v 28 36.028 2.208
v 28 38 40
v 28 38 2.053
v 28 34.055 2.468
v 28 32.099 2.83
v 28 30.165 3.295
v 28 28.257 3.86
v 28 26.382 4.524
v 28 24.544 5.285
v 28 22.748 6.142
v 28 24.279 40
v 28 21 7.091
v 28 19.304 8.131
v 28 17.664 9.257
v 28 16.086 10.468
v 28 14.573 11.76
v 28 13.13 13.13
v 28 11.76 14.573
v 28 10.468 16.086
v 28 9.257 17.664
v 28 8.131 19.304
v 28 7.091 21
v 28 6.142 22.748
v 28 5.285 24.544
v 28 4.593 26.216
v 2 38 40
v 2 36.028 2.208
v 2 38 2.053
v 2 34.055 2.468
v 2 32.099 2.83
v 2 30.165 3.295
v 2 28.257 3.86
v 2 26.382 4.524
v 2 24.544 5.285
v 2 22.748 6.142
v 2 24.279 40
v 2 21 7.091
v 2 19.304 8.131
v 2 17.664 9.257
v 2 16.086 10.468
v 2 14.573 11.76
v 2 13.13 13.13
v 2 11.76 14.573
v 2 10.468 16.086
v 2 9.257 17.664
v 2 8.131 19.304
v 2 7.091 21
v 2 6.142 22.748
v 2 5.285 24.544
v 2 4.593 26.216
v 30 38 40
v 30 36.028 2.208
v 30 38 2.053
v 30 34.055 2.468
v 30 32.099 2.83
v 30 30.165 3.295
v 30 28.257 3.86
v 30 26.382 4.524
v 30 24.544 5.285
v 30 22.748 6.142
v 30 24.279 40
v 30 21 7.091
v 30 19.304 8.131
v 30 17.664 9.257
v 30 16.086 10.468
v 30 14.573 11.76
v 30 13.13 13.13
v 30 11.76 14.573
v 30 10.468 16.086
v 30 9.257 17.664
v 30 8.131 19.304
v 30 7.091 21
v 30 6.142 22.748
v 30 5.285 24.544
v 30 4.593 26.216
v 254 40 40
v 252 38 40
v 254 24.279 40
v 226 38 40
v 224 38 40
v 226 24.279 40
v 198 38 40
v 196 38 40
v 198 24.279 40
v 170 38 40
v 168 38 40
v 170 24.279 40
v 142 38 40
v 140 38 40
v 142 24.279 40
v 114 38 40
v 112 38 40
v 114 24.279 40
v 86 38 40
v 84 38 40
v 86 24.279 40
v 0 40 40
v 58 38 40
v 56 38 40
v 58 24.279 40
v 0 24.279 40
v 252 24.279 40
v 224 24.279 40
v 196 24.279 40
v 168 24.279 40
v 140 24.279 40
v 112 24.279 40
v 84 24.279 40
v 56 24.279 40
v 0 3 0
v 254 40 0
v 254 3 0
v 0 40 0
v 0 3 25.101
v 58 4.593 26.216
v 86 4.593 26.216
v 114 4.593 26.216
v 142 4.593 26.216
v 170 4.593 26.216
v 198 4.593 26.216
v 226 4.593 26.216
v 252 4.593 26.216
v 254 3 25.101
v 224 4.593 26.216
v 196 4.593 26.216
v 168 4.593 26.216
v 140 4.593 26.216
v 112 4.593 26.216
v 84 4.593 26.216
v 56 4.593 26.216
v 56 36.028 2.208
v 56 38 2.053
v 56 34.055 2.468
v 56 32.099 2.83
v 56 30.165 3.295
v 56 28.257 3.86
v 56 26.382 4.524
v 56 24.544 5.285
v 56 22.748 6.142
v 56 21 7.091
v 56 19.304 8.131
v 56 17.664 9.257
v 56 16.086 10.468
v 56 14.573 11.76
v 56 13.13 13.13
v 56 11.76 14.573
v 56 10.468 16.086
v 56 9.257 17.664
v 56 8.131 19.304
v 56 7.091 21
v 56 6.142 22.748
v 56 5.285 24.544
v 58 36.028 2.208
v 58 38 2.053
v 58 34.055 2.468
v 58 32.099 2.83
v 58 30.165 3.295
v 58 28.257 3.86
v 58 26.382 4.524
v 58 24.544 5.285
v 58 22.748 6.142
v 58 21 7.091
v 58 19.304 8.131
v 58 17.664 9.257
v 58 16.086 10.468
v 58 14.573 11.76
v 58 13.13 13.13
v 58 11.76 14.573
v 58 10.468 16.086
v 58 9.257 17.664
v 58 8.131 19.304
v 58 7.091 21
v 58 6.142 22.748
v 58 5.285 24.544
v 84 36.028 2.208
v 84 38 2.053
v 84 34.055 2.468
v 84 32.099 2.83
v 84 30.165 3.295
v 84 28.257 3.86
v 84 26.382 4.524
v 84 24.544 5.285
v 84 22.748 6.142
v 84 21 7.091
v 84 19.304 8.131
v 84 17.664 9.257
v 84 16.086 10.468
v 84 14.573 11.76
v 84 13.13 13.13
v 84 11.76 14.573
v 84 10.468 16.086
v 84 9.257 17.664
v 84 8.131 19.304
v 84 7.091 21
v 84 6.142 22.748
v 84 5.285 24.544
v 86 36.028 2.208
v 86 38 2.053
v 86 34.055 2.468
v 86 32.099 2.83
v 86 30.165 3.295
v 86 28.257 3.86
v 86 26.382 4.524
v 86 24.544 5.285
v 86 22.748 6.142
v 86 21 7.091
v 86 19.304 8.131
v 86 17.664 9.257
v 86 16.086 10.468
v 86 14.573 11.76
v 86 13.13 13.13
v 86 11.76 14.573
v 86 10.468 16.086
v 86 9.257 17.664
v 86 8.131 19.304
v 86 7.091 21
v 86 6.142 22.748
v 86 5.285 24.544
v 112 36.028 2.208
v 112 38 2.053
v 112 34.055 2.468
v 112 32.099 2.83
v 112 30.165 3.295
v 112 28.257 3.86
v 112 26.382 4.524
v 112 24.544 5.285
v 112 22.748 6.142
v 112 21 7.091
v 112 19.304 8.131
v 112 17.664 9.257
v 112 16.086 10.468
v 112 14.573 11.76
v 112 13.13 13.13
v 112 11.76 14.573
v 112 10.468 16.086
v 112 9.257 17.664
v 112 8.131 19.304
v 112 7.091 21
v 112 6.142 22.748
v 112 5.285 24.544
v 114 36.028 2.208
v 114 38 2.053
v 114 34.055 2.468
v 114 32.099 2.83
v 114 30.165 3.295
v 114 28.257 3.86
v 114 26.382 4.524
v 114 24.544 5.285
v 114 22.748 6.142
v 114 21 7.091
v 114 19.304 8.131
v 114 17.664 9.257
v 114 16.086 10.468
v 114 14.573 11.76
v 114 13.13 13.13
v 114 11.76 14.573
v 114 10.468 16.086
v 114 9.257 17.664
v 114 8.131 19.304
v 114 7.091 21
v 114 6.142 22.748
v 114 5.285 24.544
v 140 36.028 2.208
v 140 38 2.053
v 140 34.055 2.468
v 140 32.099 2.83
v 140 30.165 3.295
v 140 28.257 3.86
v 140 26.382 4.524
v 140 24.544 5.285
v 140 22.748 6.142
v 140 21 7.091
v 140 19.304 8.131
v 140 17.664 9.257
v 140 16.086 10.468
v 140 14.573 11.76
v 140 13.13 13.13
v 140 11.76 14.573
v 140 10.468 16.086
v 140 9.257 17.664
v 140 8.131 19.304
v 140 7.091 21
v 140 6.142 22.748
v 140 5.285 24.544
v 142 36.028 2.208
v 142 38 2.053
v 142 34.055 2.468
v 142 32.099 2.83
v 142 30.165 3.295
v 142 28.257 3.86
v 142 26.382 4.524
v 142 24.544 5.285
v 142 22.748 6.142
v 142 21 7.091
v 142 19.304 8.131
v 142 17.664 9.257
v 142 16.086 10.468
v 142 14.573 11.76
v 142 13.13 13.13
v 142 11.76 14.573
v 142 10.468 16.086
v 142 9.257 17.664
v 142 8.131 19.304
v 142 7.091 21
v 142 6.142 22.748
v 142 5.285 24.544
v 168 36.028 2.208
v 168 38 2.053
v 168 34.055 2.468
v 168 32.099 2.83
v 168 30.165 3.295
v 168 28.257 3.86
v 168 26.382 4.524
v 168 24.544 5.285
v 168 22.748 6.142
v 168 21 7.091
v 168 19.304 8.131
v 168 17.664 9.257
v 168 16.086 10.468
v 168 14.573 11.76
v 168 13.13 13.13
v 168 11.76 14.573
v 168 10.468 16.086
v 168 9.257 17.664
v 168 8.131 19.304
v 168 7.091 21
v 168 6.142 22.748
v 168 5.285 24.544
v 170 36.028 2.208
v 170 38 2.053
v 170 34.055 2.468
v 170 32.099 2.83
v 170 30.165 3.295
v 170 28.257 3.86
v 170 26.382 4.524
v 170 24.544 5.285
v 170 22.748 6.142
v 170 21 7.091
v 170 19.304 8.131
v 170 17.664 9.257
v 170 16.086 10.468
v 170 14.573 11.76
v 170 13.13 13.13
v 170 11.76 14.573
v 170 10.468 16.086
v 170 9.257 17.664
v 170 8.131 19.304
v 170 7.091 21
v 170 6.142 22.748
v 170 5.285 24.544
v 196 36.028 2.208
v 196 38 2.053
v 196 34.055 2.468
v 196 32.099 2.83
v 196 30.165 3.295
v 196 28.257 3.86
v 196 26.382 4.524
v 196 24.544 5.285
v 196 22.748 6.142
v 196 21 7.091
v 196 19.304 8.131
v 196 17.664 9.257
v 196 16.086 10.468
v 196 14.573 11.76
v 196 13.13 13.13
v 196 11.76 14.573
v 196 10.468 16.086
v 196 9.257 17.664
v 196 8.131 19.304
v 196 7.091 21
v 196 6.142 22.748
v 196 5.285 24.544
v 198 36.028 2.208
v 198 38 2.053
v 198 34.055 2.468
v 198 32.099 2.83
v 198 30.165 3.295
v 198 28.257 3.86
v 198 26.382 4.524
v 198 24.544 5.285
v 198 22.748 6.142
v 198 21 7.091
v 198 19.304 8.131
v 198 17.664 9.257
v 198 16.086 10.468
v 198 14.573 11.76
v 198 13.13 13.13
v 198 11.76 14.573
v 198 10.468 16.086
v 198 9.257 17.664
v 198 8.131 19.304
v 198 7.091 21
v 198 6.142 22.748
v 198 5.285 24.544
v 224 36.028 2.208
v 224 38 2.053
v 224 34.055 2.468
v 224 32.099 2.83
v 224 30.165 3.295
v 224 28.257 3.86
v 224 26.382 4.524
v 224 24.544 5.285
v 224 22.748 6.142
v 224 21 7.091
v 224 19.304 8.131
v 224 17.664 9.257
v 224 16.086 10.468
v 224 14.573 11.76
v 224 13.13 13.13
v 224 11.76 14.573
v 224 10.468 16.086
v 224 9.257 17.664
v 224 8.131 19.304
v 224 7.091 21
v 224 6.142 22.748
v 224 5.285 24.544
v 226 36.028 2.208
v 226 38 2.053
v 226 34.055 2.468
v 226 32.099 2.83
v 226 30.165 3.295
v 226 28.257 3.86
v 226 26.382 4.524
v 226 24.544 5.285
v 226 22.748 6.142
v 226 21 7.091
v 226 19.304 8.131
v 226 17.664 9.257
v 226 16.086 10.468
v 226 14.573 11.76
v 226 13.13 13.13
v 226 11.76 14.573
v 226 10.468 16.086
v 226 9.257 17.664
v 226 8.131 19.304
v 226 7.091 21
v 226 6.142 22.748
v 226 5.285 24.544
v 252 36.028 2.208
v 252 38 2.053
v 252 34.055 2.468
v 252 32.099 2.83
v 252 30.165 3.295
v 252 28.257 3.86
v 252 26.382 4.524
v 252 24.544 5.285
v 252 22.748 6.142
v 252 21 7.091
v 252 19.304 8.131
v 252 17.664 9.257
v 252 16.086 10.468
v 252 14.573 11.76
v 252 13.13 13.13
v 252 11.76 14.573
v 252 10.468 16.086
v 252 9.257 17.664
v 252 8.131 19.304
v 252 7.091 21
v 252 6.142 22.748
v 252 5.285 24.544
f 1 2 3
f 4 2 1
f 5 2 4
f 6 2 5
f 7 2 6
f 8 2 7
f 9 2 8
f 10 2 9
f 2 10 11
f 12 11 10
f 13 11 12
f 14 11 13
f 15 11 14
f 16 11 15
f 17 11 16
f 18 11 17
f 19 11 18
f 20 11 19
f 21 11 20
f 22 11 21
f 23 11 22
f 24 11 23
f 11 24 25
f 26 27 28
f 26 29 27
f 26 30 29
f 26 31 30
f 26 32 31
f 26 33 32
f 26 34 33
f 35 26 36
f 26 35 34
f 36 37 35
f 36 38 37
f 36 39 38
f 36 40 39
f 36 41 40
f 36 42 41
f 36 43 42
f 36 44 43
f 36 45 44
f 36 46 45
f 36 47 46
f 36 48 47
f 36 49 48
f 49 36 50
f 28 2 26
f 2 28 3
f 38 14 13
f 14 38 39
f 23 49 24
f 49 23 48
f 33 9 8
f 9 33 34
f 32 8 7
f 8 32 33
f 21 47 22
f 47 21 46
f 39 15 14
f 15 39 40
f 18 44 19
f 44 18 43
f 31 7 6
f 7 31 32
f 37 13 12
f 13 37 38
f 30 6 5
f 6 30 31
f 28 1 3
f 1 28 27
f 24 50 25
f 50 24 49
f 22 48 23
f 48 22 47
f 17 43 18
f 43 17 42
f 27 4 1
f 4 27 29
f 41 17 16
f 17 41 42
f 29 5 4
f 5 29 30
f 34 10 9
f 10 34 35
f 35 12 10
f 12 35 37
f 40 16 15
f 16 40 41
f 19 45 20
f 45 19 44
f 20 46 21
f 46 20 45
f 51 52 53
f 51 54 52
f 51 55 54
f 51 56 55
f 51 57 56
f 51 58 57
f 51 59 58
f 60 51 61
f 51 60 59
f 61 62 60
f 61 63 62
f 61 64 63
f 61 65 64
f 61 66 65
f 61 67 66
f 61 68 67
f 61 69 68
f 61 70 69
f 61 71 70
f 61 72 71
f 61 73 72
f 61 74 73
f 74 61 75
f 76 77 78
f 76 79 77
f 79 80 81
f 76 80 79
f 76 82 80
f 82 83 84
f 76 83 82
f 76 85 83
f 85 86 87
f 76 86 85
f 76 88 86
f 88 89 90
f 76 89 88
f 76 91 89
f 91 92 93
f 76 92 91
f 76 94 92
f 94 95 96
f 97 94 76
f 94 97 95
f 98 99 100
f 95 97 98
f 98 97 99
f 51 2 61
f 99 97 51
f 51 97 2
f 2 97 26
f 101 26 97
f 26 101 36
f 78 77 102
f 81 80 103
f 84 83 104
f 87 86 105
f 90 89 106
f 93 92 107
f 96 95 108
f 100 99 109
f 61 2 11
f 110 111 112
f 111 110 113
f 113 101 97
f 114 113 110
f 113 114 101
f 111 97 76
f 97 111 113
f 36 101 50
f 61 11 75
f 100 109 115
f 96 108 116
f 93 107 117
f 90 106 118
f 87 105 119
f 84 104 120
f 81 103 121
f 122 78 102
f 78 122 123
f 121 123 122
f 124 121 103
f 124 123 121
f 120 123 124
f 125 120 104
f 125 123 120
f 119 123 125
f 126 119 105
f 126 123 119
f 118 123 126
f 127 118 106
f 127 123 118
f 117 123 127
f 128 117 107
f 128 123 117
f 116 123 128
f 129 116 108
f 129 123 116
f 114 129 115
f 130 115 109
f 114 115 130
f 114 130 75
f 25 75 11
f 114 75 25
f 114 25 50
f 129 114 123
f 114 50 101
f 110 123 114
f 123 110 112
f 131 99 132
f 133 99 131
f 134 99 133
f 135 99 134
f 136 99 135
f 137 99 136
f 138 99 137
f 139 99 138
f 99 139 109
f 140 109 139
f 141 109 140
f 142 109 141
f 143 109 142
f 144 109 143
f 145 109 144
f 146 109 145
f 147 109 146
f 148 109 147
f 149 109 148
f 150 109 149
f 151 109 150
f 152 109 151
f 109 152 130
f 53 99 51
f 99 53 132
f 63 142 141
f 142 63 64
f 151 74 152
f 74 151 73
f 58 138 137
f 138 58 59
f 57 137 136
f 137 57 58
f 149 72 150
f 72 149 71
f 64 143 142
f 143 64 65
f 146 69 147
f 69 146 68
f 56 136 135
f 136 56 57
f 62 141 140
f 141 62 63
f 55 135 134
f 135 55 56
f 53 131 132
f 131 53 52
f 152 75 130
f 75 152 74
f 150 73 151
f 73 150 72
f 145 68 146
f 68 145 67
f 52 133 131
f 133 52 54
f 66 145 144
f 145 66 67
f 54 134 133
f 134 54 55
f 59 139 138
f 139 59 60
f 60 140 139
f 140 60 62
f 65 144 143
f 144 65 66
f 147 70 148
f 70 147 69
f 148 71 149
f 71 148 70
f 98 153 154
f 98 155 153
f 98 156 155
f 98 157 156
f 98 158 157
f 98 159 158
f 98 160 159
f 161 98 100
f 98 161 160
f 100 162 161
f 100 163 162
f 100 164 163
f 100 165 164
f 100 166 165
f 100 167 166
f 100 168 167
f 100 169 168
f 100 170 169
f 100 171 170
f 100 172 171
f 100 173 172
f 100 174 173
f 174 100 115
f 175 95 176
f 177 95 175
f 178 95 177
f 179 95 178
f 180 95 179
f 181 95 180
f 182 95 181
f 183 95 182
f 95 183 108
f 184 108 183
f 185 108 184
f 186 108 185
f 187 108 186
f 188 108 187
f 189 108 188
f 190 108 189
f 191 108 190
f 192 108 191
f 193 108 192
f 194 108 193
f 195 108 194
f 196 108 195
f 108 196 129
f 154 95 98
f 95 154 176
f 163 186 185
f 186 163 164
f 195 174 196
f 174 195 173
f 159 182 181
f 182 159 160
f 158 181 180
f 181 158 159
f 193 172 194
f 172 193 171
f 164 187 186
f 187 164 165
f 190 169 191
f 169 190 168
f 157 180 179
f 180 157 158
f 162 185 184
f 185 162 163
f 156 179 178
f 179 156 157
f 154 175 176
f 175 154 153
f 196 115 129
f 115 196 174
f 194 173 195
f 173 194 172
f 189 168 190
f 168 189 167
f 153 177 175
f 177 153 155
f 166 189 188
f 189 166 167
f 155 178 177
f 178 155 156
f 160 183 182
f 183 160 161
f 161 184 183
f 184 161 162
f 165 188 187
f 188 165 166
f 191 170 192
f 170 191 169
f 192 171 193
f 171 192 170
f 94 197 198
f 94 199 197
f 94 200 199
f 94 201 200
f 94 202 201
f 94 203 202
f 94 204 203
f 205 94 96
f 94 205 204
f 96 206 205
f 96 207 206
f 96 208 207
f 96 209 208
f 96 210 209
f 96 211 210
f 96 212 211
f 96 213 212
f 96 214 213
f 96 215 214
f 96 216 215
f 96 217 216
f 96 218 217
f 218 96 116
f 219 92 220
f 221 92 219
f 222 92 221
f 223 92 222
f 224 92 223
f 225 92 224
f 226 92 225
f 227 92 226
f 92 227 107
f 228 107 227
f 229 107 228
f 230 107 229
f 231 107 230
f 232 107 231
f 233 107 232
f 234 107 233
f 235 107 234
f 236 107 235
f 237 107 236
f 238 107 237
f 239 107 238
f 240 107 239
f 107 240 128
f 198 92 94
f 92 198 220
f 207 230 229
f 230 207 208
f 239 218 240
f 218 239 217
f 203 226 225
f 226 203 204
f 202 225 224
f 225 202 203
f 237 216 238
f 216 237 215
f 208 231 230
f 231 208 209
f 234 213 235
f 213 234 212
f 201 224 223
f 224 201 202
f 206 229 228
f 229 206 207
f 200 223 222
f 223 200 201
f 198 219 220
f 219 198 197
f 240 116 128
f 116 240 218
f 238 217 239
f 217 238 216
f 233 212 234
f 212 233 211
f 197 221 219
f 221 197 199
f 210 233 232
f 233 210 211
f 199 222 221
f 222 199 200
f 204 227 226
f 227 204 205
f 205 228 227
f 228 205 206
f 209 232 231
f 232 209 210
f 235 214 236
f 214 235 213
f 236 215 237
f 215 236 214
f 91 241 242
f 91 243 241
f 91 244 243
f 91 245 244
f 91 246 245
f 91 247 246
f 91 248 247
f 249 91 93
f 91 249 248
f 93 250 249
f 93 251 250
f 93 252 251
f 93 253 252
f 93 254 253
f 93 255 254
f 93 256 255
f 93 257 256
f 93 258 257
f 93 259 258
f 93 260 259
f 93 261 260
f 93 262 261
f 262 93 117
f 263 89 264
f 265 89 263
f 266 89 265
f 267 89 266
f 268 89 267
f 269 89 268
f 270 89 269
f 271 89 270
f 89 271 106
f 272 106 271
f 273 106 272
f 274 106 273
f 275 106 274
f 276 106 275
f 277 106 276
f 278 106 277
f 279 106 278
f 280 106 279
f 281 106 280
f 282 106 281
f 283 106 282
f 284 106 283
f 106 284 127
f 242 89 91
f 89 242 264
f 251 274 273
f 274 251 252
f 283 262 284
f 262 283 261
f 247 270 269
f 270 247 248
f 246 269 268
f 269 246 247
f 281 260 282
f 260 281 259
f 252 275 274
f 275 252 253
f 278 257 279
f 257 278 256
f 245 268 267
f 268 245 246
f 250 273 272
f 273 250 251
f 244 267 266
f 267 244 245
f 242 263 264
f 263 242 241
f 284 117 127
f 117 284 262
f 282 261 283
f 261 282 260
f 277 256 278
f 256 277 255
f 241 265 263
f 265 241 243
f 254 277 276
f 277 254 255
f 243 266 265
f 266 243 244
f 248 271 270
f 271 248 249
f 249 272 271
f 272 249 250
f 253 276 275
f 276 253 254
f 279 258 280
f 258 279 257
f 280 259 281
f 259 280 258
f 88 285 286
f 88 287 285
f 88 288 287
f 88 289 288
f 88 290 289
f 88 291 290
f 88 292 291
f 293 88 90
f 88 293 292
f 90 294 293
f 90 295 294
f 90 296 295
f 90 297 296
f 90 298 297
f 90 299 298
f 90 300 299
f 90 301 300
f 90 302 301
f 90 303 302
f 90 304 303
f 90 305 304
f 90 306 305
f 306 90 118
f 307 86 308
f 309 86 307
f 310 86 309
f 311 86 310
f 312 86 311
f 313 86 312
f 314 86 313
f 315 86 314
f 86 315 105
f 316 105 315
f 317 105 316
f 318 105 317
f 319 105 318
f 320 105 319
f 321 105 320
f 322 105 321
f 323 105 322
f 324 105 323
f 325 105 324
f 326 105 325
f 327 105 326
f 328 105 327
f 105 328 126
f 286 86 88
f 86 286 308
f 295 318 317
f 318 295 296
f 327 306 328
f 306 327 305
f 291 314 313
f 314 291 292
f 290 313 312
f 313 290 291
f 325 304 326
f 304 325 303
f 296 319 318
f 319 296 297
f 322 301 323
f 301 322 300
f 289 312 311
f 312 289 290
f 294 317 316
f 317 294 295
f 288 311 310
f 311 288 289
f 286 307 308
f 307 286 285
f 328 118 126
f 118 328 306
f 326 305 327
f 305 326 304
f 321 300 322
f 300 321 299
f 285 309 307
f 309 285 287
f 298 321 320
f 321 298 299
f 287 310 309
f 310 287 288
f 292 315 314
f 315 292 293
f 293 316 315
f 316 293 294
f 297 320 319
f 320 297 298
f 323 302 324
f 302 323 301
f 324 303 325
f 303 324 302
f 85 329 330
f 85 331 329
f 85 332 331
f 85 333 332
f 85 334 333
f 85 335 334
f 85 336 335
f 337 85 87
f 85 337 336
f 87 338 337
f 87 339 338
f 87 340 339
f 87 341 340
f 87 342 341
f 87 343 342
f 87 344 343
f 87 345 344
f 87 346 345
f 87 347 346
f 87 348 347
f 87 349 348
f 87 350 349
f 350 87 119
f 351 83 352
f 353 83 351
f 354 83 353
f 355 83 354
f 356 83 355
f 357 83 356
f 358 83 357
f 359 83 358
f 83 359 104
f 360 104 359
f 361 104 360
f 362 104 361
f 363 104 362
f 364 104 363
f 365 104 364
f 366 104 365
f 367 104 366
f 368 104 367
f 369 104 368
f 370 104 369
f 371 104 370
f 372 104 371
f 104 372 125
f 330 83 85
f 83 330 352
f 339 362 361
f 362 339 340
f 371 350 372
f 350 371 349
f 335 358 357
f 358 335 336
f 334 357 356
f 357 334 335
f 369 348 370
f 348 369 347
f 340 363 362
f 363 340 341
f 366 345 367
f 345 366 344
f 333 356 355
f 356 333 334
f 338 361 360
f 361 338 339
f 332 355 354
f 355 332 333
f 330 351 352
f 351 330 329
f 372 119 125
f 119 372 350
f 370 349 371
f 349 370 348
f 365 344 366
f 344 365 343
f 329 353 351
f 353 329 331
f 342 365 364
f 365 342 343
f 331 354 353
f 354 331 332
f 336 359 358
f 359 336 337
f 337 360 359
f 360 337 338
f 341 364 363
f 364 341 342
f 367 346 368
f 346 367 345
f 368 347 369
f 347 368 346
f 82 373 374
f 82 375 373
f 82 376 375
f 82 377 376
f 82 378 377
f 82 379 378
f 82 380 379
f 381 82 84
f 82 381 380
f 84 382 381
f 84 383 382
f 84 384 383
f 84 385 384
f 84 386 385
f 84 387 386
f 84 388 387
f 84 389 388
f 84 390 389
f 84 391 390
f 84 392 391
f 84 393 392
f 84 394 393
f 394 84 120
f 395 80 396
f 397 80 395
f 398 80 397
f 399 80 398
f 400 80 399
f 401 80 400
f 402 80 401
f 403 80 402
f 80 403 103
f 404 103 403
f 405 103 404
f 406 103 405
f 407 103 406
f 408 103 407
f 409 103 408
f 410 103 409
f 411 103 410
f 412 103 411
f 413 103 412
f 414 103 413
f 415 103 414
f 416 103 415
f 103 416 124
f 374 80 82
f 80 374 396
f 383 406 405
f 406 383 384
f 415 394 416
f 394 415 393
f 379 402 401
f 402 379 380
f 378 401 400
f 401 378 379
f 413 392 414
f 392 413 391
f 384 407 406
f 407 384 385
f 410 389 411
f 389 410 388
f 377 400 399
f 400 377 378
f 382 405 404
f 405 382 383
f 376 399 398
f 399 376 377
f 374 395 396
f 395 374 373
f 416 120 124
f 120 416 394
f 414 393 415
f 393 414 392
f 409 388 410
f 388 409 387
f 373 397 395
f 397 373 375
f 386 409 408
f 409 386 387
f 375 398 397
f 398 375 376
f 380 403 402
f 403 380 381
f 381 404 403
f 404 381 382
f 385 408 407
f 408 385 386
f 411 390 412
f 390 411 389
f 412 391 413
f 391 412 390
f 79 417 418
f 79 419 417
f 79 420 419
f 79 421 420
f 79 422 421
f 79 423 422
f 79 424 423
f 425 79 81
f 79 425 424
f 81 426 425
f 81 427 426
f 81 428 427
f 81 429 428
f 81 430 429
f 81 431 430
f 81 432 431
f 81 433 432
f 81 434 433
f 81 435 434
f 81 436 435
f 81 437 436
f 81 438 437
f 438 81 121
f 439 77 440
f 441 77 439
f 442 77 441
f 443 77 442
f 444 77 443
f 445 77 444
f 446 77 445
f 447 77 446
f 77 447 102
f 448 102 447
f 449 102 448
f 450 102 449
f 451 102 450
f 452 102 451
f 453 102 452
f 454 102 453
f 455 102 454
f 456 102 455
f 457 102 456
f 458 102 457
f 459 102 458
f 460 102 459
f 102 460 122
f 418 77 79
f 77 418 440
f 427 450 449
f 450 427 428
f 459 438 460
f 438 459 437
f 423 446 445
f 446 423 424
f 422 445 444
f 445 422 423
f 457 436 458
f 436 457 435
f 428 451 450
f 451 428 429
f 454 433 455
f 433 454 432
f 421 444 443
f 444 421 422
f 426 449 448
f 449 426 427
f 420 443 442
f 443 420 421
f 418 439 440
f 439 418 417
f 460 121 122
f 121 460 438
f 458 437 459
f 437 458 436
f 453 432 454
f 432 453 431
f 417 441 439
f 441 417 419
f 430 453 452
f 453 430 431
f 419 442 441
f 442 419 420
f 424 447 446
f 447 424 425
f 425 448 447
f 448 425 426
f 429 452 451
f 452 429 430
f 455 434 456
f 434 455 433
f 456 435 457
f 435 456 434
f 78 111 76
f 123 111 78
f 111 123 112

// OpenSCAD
$fn=120;
box_x=30;
box_y=40;
box_z=40;
clip=17;

wall=2;
walll=wall*2;

pad=0.1;
padd=pad*2;

angle=35;

lazy=3;
count=8;

module box() {
    difference() {
        cube([box_x,box_y,box_z]);
        intersection() {
            translate([wall,wall,wall])
            cube([box_x-walll,box_y-walll,box_z-wall+pad]);
            translate([0,box_y,box_y])
            rotate([0,90,0])
            cylinder(h=box_x,r=box_y-wall);
        }
        translate([-pad,0,box_z-clip])
        rotate([angle,0,0])
        cube([box_x+padd,box_y,box_z]);
        translate([-pad,-pad,-pad])
        cube([box_x+padd,lazy+pad,box_y+padd]);
    }
}
for(x=[0:box_x-wall:count*(box_x-wall)]) {
    translate([x,0,0])
    box();
}
